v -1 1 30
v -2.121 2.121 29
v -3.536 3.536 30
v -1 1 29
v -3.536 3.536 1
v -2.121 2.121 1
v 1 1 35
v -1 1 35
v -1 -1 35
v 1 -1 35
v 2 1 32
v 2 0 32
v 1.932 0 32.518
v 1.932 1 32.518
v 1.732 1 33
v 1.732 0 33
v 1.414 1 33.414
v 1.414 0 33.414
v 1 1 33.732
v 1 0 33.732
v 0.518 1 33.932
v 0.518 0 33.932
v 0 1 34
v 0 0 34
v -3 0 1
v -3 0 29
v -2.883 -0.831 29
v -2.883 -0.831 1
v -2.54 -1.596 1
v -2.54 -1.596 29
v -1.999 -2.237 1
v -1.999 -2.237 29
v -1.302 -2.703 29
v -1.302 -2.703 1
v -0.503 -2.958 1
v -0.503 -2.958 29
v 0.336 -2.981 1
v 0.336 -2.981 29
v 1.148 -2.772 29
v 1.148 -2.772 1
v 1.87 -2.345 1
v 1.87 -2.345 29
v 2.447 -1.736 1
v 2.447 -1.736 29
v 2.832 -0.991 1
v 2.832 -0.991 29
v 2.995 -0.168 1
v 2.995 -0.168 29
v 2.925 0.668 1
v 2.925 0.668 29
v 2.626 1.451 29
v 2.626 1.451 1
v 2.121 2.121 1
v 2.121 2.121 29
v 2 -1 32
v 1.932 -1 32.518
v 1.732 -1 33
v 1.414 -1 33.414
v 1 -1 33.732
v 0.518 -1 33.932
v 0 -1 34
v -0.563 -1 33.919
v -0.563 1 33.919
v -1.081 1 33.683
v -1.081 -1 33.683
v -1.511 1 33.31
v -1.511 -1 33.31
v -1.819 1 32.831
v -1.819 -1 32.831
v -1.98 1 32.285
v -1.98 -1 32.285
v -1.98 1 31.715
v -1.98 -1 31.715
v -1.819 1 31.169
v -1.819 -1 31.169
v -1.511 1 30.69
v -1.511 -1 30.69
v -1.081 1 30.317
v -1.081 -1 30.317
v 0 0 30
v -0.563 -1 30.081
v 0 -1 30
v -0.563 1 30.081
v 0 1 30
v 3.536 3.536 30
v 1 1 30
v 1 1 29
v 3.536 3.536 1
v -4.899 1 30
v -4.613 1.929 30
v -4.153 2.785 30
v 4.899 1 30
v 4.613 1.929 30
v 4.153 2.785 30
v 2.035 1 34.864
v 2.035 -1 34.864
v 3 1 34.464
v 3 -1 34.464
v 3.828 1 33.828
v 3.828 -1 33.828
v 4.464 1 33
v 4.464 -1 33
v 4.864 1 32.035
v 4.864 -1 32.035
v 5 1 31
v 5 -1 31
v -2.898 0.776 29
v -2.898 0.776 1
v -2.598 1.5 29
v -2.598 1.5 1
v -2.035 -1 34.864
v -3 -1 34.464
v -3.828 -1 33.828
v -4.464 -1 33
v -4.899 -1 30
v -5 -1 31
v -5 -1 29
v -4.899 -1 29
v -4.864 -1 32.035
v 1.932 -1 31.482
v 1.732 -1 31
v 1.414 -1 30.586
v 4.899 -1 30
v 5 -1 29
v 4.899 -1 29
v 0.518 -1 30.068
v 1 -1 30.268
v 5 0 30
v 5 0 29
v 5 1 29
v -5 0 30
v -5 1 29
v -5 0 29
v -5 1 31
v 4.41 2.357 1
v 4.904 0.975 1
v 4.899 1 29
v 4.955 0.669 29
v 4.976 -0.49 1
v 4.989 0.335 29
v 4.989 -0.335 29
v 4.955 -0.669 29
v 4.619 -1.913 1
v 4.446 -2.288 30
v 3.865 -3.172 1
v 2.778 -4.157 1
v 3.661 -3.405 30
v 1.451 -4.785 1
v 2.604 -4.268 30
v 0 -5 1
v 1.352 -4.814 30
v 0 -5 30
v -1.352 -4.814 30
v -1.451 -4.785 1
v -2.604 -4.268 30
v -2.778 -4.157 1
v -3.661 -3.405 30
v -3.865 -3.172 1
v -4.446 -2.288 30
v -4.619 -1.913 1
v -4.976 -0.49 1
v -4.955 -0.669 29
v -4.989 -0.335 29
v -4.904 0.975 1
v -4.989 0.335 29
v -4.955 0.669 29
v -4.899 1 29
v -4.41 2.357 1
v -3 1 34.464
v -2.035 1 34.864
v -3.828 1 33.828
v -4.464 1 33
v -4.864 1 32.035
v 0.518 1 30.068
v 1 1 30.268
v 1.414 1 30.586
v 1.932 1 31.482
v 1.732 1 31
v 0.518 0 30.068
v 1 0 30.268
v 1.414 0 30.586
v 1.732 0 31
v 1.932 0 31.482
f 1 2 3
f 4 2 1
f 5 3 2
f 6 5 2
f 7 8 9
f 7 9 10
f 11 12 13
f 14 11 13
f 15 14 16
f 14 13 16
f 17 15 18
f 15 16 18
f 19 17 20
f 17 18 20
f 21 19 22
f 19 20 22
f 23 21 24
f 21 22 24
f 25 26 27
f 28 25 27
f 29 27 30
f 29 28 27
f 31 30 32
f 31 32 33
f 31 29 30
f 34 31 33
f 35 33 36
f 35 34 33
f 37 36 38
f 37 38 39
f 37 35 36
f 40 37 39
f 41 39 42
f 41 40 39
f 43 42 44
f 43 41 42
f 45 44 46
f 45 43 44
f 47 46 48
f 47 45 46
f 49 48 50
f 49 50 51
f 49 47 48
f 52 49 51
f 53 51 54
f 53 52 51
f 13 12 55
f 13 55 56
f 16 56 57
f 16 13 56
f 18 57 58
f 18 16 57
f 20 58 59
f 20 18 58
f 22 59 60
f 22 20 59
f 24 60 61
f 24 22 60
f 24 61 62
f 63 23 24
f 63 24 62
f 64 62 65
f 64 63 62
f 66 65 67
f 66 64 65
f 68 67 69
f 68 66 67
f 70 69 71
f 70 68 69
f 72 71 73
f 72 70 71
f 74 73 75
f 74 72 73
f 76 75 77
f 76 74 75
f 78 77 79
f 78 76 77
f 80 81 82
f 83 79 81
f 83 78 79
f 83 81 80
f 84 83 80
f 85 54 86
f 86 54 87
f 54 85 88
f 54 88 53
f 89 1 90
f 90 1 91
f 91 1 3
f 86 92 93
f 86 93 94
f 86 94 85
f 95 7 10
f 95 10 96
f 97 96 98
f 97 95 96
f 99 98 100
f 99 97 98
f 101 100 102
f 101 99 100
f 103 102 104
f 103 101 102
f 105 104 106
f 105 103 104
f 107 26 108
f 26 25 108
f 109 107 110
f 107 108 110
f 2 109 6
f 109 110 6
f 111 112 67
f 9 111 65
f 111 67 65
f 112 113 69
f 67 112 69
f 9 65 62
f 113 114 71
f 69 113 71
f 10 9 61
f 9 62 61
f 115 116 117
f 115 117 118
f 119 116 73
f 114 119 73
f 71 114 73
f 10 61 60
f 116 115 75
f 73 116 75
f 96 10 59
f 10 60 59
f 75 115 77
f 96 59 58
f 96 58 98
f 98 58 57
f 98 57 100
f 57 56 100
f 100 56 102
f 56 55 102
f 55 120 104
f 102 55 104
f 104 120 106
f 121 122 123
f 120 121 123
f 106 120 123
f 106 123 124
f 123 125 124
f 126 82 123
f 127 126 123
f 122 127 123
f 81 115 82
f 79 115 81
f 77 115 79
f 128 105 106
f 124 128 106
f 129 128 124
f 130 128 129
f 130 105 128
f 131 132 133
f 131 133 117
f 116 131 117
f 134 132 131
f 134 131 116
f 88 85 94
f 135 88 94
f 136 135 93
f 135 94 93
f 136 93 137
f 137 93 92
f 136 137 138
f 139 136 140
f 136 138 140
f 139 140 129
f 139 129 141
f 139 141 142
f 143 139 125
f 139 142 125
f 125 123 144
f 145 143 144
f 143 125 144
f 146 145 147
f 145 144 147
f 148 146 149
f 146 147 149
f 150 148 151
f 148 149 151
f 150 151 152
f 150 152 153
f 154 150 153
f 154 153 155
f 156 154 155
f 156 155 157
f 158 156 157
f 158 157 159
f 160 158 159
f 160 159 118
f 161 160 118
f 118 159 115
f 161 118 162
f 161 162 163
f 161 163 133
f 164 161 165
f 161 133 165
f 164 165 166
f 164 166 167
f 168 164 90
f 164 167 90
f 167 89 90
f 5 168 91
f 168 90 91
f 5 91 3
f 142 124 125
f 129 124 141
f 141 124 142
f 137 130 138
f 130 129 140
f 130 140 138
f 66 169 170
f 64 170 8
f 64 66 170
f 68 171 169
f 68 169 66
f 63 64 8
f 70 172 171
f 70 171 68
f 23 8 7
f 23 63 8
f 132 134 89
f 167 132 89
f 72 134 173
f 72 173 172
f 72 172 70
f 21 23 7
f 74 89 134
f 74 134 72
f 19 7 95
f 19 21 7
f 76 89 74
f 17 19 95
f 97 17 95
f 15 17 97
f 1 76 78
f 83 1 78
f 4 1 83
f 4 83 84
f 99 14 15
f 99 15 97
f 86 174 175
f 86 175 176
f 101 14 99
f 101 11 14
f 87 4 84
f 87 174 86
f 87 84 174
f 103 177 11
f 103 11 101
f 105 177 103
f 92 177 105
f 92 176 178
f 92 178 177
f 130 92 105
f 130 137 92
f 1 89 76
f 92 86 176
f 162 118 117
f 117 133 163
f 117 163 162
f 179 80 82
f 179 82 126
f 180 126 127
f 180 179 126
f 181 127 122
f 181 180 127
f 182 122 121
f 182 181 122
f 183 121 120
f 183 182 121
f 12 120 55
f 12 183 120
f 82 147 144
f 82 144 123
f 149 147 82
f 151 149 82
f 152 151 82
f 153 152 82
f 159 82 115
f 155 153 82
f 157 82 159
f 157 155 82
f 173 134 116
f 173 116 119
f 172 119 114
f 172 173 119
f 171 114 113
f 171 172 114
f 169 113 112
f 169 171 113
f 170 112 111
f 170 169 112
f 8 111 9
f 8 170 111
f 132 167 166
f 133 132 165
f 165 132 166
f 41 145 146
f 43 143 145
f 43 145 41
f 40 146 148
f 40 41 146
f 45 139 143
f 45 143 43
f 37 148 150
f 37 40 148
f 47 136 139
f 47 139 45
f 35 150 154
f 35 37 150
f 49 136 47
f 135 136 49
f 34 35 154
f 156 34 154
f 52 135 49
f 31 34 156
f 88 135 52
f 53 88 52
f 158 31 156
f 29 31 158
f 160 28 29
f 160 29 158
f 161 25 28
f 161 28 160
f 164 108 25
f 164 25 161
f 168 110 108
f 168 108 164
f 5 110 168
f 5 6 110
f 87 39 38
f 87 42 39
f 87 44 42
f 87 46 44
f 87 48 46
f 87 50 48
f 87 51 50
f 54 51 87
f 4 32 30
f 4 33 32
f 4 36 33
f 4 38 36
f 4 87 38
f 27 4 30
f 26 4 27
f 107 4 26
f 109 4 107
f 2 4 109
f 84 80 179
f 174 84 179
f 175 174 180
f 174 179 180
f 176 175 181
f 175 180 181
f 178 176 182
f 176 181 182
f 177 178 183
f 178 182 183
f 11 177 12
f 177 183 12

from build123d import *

# Parameters (mm, degrees)
SKETCH1_R                = 2
BOSS_EXTRUDE1_DEPTH      = 1
REVOLVE1_ANGLE           = 225
REVOLVE1_OTHER_WAY_ANGLE = 45


with BuildPart() as part:
    # Sketch1 → Boss-Extrude1 (new, symmetric)
    with BuildSketch(Plane(origin=(0, 0, 0), x_dir=(1, 0, 0), z_dir=(0, 1, 0))):
        with BuildLine():
            Line((-5, -29), (-5, -31))
            ThreePointArc((-5, -31), (-3.828427125, -33.828427125), (-1, -35))
            Line((-1, -35), (1, -35))
            ThreePointArc((1, -35), (3.828427125, -33.828427125), (5, -31))
            Line((5, -31), (5, -29))
            Line((5, -29), (-5, -29))
        make_face()
        with Locations((0, -32)):
            Circle(SKETCH1_R, mode=Mode.SUBTRACT)
    extrude(amount=BOSS_EXTRUDE1_DEPTH, both=True)

    # Sketch1<3> → Revolve1 (revolve)
    with BuildSketch(Plane(origin=(0, 0, 0), x_dir=(1, 0, 0), z_dir=(0, 1, 0))):
        Polygon((0, -30), (0, -29), (-3, -29), (-3, -1), (-5, -1), (-5, -30), align=None)
    revolve(axis=Axis((0, 0, 0), (0, 0, 1)), revolution_arc=REVOLVE1_ANGLE)

    # Sketch1<3> → Revolve1 other way (revolve)
    with BuildSketch(Plane(origin=(0, 0, 0), x_dir=(1, 0, 0), z_dir=(0, 1, 0))):
        Polygon((0, -30), (0, -29), (-3, -29), (-3, -1), (-5, -1), (-5, -30), align=None)
    revolve(axis=Axis((0, 0, 0), (0, 0, -1)), revolution_arc=REVOLVE1_OTHER_WAY_ANGLE)


solid = part.part
